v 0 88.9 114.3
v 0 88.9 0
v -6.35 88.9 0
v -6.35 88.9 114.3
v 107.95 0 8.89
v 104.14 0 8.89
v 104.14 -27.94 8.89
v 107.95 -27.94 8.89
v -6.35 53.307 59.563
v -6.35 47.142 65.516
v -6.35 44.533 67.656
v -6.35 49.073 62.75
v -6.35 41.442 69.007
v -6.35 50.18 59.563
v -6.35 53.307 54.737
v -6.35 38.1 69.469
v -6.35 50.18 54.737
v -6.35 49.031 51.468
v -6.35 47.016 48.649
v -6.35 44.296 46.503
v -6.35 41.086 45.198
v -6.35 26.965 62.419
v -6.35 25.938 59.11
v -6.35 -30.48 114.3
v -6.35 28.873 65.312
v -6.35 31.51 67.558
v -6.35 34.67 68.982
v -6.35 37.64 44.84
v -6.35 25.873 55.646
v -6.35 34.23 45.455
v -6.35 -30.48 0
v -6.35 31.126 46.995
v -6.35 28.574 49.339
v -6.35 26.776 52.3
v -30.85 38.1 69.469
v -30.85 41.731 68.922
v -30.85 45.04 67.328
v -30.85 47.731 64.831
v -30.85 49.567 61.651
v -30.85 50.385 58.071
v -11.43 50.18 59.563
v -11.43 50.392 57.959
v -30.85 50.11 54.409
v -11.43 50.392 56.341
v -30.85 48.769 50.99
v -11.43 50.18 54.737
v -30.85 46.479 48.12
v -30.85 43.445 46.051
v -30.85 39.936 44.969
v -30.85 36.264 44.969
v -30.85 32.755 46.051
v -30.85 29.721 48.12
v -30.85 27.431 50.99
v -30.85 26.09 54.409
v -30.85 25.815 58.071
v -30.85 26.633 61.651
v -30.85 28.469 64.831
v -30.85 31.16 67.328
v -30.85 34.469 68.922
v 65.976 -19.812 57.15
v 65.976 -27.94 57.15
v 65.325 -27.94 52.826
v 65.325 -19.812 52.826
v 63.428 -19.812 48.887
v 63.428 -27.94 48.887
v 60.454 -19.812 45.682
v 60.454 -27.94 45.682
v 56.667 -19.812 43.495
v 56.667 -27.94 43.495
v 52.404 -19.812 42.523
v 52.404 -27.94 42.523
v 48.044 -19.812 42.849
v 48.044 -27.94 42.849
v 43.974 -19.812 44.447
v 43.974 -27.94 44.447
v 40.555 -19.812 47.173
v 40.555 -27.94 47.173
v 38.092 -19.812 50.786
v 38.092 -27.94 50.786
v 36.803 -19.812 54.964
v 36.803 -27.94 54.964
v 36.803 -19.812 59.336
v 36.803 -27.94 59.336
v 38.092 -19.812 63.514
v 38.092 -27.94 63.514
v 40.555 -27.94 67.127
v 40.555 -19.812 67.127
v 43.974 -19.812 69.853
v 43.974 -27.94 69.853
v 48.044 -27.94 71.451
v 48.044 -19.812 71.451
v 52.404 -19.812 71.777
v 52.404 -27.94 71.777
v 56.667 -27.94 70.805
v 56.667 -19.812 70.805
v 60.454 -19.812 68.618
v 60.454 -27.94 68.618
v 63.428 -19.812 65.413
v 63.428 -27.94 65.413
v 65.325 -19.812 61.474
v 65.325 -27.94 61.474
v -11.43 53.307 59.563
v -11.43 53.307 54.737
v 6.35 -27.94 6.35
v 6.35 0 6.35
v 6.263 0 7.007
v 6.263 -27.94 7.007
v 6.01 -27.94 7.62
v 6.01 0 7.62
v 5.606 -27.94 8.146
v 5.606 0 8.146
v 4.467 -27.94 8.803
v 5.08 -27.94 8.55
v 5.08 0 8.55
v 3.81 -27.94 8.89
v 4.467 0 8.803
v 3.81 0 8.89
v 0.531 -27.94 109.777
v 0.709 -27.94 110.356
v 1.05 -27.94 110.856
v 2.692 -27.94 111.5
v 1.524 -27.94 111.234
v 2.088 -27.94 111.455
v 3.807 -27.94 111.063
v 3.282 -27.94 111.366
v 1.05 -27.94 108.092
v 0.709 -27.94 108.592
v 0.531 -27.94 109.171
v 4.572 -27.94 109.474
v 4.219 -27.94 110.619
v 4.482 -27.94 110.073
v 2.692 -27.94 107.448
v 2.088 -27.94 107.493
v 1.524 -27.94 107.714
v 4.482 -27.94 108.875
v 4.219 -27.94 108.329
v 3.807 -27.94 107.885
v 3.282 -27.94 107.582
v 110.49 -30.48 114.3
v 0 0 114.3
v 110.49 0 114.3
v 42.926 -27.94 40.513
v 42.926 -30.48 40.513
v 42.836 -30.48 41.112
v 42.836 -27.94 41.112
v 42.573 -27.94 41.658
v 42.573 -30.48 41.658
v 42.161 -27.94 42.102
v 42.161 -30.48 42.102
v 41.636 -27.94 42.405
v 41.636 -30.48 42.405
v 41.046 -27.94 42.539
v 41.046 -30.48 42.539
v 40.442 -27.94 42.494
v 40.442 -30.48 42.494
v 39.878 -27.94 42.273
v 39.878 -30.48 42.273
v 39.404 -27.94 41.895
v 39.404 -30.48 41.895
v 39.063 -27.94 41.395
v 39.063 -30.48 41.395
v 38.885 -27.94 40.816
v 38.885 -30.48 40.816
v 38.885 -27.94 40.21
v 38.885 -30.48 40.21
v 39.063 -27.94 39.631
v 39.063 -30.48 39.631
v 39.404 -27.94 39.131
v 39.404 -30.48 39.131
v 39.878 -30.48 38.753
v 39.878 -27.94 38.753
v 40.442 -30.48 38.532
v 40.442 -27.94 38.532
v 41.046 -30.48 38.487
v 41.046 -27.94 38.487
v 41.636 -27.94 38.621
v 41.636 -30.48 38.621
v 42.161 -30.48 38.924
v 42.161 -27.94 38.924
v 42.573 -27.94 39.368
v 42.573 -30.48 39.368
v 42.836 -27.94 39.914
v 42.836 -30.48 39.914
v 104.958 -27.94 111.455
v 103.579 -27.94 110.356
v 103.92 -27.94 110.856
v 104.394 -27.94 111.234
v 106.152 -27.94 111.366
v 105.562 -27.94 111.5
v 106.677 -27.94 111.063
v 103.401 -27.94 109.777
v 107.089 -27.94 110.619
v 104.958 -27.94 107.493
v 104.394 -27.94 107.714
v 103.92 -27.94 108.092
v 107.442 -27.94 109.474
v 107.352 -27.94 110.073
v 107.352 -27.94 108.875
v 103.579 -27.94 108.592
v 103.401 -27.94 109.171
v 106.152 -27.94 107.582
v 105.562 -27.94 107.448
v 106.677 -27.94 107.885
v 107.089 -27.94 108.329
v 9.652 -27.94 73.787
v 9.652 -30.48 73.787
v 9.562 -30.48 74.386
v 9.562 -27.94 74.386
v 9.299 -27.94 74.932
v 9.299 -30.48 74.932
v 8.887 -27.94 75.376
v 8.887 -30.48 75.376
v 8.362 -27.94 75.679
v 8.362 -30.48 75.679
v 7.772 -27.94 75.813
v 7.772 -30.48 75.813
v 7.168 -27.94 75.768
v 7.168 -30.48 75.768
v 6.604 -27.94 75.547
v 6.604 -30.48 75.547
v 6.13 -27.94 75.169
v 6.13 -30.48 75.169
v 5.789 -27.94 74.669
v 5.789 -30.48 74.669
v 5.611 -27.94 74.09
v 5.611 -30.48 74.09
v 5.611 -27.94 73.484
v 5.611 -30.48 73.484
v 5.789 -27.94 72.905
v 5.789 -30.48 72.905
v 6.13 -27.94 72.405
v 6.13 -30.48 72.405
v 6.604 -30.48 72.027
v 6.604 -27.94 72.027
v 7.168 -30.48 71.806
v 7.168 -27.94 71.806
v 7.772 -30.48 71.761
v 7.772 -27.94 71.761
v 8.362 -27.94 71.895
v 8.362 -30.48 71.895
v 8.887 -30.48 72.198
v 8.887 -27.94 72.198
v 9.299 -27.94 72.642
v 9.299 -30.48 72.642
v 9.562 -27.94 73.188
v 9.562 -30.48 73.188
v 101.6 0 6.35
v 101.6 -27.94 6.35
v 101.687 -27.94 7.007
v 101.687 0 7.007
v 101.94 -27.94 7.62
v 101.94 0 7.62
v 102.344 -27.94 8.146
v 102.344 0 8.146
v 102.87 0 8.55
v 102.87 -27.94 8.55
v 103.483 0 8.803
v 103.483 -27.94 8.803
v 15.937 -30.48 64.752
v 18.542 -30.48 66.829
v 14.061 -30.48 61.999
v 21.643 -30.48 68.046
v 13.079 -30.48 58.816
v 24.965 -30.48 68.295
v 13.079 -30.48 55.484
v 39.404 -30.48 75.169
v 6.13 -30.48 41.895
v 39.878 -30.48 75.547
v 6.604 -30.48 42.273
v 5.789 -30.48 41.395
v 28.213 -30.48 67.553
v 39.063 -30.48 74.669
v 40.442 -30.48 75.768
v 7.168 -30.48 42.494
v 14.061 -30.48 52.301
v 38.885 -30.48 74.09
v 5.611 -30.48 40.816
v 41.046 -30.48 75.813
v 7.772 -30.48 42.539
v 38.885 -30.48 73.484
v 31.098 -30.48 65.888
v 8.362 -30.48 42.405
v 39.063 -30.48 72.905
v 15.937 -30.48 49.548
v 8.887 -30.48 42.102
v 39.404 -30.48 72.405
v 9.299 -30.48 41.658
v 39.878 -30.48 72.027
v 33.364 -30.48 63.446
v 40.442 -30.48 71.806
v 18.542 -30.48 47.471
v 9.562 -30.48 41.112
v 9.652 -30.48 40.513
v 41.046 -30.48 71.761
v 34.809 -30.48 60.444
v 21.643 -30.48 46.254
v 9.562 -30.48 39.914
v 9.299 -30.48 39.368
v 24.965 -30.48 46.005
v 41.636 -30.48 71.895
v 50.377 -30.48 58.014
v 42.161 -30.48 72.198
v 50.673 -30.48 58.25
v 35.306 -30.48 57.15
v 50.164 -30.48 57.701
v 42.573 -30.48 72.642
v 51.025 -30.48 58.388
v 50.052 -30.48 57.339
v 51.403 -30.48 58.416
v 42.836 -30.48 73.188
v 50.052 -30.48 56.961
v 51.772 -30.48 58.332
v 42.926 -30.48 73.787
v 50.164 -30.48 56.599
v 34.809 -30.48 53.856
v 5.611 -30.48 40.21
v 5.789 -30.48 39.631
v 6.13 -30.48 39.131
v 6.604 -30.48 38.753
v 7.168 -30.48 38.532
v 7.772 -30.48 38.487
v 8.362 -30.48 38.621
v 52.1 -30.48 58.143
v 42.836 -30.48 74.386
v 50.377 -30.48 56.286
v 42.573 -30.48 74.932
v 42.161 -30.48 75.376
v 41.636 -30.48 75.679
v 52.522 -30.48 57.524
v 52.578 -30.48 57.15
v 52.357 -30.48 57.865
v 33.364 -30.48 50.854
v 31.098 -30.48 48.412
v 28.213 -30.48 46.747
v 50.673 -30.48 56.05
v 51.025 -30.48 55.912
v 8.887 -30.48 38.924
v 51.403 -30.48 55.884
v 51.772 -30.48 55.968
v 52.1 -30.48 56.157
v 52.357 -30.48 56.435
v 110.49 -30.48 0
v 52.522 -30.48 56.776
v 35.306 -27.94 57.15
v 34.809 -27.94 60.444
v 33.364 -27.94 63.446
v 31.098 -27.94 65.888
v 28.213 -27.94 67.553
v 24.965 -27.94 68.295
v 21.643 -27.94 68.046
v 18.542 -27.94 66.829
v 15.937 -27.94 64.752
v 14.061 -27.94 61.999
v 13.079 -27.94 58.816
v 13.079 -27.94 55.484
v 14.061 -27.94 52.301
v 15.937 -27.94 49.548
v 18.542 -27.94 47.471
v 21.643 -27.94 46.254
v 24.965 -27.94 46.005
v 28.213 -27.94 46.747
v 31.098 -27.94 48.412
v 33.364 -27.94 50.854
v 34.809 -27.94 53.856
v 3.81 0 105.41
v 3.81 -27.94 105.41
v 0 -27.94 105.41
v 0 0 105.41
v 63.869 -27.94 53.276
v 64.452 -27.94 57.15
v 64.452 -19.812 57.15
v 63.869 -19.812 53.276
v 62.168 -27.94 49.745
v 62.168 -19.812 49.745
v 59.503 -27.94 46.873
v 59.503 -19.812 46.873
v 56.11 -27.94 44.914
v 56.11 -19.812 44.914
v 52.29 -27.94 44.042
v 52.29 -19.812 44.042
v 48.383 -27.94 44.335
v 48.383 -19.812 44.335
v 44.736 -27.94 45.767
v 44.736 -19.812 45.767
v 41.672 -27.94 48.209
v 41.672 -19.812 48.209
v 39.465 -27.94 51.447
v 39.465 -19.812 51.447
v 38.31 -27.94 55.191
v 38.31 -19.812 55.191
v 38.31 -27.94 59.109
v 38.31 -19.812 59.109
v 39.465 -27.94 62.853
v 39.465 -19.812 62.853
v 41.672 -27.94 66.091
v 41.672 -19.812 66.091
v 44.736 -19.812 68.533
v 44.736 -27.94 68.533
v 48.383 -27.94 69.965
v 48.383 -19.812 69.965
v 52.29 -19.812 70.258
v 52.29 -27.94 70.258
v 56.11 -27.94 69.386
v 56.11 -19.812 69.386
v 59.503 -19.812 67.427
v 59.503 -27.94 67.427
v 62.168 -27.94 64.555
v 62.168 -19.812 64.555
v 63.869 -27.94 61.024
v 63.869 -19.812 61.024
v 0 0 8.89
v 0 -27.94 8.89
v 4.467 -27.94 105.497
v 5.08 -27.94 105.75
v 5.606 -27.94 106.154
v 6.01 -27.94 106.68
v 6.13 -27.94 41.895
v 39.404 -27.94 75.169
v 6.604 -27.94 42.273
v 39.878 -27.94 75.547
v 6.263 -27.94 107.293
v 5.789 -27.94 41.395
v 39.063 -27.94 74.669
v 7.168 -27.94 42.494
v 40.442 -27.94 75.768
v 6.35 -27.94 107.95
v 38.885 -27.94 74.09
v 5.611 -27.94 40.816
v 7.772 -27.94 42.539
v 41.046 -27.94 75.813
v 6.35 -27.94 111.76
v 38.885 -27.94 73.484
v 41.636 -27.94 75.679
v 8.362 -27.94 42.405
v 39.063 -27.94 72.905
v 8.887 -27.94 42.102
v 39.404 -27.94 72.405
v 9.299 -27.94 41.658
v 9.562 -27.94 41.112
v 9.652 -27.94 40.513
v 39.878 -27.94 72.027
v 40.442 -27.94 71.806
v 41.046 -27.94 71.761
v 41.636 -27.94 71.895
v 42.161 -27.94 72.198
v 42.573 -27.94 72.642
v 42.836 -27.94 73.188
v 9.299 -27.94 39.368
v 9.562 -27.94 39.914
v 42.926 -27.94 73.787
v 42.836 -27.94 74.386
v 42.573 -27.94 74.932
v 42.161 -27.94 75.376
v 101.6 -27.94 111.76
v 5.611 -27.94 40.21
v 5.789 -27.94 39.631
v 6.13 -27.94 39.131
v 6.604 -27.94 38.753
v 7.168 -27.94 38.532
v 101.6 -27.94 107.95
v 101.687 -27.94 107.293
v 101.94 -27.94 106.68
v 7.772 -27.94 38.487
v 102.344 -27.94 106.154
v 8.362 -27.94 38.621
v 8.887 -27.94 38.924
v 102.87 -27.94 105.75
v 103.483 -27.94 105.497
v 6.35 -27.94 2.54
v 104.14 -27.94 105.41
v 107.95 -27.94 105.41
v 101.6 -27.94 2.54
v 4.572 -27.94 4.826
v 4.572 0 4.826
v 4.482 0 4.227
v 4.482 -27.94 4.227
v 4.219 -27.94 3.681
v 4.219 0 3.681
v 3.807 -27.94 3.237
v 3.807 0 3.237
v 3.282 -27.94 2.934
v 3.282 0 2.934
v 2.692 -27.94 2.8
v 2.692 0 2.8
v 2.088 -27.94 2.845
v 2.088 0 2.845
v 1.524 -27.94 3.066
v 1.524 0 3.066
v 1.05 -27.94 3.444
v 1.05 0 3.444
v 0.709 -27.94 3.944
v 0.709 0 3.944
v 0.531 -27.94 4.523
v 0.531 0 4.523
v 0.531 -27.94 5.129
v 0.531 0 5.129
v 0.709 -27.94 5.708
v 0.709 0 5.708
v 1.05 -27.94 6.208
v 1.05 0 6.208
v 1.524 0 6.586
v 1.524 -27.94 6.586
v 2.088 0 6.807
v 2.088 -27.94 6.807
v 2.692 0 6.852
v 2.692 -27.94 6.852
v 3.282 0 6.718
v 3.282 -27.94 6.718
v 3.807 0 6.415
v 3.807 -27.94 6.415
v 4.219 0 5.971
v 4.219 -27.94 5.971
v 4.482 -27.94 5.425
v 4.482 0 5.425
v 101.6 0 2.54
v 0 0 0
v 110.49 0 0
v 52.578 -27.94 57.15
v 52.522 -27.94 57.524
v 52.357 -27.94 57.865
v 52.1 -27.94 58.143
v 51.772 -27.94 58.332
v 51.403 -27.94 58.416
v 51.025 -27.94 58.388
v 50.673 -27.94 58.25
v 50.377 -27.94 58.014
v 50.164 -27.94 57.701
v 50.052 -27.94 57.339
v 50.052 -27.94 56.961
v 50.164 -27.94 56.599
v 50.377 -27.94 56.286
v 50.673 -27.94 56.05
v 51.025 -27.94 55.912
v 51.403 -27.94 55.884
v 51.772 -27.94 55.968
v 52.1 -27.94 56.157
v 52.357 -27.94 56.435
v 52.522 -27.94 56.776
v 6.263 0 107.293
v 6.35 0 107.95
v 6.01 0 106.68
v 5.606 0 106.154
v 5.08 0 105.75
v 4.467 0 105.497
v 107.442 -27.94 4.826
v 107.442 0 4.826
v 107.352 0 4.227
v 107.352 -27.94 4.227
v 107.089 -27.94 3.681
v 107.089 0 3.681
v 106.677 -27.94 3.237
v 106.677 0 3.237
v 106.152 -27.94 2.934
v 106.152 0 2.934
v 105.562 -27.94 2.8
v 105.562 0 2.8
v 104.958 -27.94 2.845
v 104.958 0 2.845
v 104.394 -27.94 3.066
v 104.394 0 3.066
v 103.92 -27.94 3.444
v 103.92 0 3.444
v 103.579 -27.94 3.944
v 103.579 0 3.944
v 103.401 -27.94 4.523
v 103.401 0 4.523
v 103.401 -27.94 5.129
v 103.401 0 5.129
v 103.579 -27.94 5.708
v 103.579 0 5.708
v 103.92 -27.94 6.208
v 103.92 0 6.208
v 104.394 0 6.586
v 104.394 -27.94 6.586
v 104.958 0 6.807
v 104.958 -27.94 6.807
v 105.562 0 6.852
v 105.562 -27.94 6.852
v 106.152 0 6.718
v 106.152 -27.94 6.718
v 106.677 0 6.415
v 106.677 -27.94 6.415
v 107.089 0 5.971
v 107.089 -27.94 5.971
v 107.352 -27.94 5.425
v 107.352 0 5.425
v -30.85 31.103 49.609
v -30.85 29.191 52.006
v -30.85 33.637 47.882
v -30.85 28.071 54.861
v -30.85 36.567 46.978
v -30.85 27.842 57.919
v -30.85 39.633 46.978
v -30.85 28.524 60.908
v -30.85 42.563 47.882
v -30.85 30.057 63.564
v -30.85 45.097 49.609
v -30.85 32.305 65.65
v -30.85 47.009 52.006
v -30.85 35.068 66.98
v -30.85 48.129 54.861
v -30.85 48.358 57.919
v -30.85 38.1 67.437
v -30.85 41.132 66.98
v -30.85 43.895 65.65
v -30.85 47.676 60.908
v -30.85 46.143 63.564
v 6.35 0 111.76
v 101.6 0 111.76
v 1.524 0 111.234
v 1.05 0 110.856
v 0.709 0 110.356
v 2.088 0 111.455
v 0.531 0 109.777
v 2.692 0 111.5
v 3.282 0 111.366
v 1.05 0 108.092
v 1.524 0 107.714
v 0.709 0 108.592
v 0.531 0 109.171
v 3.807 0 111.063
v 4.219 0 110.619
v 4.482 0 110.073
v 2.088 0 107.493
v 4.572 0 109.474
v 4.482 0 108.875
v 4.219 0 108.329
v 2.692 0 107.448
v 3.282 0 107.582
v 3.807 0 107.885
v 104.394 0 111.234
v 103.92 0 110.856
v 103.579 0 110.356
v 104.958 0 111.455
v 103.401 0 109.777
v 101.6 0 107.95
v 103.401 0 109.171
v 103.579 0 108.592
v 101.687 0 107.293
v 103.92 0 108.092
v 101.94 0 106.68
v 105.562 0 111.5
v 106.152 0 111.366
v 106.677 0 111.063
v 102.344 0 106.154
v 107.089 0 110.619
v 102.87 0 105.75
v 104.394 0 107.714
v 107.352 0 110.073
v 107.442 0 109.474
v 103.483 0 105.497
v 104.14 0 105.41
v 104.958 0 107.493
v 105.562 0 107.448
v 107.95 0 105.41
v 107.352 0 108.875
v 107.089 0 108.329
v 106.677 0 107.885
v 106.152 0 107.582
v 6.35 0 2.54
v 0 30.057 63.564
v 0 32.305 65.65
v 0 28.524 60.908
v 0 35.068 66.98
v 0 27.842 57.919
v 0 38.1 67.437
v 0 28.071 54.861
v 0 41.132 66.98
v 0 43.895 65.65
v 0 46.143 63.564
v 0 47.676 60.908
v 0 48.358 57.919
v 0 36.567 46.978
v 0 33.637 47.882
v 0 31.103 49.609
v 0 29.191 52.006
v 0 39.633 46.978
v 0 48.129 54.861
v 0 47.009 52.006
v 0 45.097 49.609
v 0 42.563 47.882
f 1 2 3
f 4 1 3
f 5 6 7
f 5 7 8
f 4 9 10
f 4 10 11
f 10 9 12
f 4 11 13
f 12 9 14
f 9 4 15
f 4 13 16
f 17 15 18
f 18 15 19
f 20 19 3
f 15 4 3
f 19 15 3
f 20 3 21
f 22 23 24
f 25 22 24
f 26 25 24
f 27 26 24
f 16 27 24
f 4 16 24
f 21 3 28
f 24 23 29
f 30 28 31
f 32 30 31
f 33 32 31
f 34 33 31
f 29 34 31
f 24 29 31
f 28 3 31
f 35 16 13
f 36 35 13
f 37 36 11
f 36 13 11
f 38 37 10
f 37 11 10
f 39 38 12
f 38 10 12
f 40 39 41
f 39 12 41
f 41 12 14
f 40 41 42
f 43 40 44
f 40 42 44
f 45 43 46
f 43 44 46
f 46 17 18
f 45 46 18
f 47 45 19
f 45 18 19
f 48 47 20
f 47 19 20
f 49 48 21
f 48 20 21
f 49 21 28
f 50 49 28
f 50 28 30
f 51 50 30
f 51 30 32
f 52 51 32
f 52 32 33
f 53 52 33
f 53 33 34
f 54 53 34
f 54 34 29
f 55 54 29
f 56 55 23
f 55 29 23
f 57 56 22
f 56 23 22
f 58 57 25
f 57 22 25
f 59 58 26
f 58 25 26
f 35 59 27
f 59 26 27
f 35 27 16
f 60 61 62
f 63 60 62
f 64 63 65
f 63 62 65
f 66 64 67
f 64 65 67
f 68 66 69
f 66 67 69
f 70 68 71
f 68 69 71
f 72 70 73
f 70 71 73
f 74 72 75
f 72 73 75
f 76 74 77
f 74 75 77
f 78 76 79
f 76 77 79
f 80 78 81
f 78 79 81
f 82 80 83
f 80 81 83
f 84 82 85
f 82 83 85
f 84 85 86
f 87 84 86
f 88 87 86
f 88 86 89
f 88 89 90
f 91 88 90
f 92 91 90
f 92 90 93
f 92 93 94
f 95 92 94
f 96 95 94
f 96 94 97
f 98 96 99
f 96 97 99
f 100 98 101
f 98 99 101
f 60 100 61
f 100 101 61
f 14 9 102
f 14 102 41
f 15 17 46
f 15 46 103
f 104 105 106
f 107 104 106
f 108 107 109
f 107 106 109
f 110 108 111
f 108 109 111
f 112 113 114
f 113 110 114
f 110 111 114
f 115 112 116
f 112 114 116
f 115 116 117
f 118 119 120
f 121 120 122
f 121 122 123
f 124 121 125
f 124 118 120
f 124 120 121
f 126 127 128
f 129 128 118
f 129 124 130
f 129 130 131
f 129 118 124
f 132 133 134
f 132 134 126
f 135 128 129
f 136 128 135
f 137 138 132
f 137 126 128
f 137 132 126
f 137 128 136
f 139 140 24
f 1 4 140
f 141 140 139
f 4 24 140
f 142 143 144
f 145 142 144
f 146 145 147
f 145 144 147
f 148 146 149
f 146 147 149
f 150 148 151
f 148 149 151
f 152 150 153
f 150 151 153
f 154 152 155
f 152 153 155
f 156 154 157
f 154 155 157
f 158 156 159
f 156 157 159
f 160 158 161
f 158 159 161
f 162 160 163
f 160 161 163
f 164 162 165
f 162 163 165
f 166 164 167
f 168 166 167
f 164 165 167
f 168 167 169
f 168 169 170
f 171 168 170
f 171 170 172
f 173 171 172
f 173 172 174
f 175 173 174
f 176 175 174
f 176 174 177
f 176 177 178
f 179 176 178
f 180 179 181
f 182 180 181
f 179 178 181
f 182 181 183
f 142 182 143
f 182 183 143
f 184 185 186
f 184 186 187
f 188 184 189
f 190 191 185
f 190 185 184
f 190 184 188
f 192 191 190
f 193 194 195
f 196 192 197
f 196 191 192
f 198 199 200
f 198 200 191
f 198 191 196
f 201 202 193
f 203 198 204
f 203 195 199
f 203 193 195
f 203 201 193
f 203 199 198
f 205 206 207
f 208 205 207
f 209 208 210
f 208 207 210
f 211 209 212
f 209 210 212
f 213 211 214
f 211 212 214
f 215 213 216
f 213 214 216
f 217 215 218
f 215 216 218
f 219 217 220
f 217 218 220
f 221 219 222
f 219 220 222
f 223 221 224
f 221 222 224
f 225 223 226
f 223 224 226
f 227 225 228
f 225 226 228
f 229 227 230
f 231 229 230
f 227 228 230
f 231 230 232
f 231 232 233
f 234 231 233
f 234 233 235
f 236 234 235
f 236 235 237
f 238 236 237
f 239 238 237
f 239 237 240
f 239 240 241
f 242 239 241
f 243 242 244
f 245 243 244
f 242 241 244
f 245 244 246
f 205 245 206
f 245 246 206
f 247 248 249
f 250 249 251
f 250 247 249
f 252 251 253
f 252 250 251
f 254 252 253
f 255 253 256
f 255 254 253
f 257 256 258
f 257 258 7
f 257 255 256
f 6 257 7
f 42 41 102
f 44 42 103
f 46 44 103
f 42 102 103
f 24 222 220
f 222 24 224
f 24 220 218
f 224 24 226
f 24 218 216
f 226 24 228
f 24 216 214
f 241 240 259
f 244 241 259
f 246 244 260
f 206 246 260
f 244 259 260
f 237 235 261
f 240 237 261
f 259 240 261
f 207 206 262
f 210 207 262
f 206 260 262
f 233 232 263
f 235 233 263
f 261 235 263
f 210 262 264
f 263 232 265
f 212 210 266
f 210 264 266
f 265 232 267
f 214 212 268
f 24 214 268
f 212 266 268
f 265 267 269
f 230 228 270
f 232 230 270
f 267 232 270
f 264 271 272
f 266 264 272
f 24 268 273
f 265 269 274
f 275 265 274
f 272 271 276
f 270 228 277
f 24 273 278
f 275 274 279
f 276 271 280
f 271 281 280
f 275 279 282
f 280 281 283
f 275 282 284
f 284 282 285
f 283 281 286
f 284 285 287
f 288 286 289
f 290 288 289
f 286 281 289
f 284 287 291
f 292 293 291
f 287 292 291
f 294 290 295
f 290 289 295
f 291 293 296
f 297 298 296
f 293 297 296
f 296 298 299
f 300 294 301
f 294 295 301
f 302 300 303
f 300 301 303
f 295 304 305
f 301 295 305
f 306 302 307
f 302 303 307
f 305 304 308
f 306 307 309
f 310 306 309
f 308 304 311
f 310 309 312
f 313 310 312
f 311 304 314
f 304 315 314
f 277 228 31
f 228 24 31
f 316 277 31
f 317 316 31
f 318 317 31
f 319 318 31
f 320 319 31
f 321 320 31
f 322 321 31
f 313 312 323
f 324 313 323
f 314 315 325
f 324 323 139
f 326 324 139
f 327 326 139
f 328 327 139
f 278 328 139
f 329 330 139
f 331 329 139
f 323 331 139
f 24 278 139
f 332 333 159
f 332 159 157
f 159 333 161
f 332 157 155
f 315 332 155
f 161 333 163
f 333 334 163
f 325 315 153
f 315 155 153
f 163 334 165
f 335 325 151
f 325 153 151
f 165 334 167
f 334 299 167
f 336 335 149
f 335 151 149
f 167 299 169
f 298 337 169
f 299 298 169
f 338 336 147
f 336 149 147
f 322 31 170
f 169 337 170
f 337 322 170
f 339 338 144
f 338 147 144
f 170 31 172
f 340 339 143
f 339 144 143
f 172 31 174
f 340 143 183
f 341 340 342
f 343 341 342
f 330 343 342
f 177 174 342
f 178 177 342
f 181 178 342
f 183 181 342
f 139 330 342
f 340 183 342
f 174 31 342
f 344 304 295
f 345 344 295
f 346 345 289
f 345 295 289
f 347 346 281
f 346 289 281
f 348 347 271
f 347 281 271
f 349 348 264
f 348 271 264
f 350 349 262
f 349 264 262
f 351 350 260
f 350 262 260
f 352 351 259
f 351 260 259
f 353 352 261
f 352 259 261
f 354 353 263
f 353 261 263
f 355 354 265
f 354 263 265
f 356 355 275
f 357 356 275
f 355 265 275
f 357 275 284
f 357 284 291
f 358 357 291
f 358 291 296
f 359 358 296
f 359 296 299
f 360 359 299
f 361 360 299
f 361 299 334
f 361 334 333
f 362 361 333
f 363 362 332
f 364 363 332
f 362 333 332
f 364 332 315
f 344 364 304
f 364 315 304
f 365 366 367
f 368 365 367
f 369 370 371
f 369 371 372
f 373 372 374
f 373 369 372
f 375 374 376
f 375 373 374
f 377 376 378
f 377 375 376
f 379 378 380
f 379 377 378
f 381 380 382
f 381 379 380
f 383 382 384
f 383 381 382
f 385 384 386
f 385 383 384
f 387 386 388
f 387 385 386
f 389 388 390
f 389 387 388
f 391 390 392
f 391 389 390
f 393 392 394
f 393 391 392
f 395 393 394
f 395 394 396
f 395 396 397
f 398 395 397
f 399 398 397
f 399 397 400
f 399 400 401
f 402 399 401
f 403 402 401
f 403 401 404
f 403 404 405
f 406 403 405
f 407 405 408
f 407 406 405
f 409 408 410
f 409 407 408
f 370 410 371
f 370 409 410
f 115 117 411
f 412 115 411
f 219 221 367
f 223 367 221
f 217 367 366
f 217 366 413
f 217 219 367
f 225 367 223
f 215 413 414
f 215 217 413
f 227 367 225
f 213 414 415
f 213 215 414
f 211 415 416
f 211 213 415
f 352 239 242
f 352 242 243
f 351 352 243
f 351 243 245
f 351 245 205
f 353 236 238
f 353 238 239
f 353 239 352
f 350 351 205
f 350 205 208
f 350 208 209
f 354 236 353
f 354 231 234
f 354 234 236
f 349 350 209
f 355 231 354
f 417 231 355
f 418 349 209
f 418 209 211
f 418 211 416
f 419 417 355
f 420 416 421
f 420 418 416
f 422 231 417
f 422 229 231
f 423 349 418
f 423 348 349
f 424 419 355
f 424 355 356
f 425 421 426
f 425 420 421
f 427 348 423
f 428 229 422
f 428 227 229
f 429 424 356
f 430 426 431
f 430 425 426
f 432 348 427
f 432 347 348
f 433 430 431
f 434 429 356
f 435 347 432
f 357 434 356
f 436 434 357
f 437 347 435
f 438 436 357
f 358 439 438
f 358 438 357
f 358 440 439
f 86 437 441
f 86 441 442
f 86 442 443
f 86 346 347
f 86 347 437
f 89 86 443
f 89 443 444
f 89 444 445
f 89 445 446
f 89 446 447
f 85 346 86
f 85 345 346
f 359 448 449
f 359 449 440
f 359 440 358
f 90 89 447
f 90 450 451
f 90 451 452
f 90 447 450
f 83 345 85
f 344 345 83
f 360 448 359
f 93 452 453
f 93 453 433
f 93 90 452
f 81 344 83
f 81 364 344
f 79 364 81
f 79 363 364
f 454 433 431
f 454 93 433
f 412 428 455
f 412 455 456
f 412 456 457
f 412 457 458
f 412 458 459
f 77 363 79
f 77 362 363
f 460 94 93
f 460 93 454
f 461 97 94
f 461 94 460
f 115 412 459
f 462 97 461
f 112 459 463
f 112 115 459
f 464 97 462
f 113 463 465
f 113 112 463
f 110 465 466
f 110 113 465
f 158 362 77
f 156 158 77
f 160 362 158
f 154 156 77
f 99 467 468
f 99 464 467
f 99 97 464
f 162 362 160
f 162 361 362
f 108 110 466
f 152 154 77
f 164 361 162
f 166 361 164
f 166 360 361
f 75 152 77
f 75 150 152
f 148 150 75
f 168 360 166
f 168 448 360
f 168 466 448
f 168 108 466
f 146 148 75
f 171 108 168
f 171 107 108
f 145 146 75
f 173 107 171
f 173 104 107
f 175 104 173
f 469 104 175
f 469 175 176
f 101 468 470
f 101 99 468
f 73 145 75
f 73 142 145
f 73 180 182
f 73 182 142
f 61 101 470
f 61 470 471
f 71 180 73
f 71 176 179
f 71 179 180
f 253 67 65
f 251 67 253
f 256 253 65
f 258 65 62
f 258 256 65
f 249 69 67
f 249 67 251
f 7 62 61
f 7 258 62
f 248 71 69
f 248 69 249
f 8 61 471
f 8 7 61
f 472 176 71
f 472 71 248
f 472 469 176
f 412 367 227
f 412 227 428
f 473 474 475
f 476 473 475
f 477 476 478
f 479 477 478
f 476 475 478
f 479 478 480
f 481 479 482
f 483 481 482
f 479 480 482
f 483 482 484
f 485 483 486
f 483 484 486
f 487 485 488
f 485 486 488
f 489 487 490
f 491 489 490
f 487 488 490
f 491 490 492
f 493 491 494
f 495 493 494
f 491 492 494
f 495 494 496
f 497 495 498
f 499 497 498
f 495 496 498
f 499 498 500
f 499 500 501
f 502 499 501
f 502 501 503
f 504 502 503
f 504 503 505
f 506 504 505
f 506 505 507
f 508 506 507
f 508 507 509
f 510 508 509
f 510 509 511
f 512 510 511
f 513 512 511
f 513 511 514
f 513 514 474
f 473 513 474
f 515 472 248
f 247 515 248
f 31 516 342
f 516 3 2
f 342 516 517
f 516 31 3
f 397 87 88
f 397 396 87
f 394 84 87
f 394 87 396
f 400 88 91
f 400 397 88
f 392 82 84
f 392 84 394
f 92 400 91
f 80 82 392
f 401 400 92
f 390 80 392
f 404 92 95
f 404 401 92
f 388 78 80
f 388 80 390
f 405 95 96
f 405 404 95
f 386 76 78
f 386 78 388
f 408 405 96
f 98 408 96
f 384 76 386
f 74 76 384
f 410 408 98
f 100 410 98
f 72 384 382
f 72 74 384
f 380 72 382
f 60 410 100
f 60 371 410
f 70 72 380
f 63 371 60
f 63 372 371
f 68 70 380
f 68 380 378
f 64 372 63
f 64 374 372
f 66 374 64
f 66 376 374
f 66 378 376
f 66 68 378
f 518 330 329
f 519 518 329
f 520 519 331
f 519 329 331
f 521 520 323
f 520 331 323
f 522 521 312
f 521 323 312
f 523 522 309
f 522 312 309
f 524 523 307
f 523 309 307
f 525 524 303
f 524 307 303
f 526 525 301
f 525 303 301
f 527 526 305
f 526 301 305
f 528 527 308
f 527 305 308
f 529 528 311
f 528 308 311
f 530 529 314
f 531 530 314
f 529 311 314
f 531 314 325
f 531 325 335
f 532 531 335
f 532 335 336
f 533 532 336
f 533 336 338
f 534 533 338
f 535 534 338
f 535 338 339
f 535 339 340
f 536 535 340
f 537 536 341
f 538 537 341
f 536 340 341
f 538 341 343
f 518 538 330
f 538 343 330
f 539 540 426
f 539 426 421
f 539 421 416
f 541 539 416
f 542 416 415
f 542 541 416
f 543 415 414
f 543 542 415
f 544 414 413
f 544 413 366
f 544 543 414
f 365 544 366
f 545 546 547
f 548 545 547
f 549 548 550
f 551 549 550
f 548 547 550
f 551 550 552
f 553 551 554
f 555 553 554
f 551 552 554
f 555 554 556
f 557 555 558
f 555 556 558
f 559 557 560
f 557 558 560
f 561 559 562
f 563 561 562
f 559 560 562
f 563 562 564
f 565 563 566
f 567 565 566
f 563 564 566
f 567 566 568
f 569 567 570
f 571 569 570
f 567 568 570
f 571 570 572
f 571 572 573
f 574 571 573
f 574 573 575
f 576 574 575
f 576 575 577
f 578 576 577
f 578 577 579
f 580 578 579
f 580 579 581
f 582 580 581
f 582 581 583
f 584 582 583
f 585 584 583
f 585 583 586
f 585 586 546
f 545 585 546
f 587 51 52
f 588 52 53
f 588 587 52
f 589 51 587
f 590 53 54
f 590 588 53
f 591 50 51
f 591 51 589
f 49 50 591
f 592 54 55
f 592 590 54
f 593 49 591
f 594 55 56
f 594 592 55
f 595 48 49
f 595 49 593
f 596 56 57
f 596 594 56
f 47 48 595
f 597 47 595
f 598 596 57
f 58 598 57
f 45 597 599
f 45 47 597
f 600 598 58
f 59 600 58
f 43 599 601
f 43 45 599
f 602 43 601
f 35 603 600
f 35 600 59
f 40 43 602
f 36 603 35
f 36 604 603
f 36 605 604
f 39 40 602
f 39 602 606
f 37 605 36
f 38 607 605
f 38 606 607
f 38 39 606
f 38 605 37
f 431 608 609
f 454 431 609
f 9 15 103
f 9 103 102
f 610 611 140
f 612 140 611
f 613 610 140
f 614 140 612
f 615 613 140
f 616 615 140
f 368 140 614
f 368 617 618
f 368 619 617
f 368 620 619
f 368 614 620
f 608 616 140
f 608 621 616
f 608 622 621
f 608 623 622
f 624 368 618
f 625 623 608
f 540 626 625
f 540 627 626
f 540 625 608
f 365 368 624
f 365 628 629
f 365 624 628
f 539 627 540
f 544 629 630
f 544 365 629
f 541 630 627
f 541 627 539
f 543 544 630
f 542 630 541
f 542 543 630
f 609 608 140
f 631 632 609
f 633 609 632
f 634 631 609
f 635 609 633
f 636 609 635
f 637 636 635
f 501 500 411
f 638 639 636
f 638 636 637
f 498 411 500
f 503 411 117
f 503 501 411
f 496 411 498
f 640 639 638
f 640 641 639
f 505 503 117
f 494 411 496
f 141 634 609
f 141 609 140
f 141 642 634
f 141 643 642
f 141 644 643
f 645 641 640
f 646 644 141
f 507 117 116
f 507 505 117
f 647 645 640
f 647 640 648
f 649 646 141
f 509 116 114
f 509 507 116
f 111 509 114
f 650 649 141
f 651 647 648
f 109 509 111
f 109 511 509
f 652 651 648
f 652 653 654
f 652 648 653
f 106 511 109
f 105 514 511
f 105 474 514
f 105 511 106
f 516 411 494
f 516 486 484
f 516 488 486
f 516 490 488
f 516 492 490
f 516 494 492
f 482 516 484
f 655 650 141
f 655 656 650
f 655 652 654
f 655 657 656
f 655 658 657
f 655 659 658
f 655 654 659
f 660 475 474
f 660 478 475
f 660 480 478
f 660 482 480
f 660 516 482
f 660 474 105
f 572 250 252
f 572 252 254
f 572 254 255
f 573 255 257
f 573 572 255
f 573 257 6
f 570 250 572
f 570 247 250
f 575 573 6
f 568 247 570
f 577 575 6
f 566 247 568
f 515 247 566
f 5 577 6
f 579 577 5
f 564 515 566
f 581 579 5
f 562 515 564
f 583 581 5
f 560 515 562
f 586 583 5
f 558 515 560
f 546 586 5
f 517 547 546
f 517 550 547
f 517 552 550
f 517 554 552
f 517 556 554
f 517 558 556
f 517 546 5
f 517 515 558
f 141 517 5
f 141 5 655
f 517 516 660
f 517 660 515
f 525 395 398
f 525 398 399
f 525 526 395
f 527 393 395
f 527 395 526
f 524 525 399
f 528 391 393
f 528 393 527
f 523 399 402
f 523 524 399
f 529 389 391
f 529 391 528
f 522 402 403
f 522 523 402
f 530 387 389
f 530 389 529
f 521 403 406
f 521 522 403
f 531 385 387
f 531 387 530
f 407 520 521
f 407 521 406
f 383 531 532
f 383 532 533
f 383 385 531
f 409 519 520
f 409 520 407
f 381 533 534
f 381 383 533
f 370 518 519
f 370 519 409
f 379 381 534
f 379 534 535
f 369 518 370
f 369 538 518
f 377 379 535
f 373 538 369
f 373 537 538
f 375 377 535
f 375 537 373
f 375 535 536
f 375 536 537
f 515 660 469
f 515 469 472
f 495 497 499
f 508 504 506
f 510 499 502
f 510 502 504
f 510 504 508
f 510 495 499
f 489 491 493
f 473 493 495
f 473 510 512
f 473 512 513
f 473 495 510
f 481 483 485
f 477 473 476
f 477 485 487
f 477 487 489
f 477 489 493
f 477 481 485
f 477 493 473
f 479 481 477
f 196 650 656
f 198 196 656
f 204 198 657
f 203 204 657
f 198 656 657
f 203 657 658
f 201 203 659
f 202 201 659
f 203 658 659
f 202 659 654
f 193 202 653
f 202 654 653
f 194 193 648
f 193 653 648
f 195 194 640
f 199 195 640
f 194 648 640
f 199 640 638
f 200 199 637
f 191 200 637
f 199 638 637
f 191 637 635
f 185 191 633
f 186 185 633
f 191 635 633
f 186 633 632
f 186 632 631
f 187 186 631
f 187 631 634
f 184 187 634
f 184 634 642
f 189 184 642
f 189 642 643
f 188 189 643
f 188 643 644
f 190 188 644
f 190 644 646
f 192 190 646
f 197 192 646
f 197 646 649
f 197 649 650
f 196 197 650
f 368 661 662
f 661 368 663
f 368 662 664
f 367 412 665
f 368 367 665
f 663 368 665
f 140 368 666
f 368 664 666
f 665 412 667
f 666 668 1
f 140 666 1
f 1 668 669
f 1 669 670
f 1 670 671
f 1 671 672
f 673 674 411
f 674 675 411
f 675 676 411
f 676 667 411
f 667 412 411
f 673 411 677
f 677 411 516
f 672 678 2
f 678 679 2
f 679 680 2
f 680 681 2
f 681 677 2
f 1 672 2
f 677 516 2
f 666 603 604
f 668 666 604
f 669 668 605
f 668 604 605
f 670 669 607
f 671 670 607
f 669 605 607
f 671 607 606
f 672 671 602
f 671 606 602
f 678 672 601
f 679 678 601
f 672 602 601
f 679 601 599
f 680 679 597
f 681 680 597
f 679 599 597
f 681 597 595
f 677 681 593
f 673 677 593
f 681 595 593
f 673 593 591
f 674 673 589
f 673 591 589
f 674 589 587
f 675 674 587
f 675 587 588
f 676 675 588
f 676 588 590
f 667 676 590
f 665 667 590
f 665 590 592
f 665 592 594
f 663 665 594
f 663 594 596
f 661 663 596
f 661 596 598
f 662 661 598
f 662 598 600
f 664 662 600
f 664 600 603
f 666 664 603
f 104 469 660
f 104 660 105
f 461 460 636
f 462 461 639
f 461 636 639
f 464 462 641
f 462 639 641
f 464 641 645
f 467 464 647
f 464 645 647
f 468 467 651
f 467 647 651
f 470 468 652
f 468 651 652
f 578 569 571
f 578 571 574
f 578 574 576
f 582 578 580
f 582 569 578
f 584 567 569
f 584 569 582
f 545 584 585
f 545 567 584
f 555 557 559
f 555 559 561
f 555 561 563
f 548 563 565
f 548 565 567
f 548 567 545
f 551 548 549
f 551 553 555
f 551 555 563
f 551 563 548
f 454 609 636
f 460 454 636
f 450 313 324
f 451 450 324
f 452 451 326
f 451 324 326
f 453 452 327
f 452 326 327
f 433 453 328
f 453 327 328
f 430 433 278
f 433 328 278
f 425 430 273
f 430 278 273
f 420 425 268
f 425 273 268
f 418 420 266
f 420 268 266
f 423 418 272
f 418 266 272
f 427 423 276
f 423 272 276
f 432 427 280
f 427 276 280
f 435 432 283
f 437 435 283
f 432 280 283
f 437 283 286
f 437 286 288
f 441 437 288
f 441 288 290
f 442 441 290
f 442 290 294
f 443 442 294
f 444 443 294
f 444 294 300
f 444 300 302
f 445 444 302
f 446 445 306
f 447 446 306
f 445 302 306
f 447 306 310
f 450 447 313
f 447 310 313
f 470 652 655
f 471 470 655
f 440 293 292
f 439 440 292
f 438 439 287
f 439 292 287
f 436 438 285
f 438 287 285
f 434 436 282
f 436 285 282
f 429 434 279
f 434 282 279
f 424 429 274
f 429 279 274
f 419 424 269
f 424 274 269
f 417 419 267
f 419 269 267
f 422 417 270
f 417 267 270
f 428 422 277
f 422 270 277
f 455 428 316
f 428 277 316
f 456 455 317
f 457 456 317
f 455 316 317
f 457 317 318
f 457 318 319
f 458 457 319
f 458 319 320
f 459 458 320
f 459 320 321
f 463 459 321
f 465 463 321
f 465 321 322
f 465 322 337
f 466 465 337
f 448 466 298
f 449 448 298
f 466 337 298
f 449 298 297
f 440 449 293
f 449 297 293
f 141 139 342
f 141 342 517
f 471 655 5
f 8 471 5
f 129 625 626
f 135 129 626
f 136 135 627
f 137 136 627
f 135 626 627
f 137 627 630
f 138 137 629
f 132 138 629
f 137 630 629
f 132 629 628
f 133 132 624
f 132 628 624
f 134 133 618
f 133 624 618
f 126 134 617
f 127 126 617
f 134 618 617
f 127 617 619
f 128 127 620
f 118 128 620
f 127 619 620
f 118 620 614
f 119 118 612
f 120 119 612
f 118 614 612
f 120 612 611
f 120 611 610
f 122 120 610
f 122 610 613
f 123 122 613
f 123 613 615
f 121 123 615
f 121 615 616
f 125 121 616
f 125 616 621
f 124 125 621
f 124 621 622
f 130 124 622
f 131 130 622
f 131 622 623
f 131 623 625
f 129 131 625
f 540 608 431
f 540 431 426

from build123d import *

# Parameters (mm, degrees)
BOSS_EXTRUDE1_DEPTH  = 114.3
SKETCH3_W            = 107.95
SKETCH3_H            = 109.22
CUT_EXTRUDE1_DEPTH   = 27.94
BOSS_EXTRUDE14_REACH = 32.48
SKETCH4_R            = 2.032
SKETCH5_R            = 2.032
SKETCH5_R_2          = 11.176
SKETCH5_R_3          = 1.27
CUT_EXTRUDE2_DEPTH   = 2.54
SKETCH7_R            = 12.319
BOSS_EXTRUDE15_DEPTH = 24.5
CUT_EXTRUDE3_REACH   = 143.34
SKETCH8_R            = 10.287
BOSS_EXTRUDE17_DEPTH = 5.08
SKETCH16_R           = 14.6685
SKETCH16_R_2         = 13.1445
BOSS_EXTRUDE18_DEPTH = 8.128


with BuildPart() as part:
    # Sketch1 → Boss-Extrude1 (new body)
    with BuildSketch(Plane.XY):
        Polygon((0, 0), (0, 88.9), (-6.35, 88.9), (-6.35, -30.48), (110.49, -30.48), (110.49, 0), align=None)
    extrude(amount=BOSS_EXTRUDE1_DEPTH)

    # Sketch3 → Cut-Extrude1 (cut)
    with BuildSketch(Plane(origin=(0, 0, 0), x_dir=(1, 0, 0), z_dir=(0, 1, 0))):
        with Locations((53.975, -57.15)):
            Rectangle(SKETCH3_W, SKETCH3_H)
    extrude(amount=-CUT_EXTRUDE1_DEPTH, mode=Mode.SUBTRACT)

    # Sketch4 → Boss-Extrude14 (add, up to next)
    with BuildSketch(Plane(origin=(0, 0, 0), x_dir=(1, 0, 0), z_dir=(0, 1, 0)), mode=Mode.PRIVATE) as boss_extrude14_sk1:
        with BuildLine():
            Line((0, -2.54), (6.35, -2.54))
            Line((6.35, -2.54), (6.35, -6.35))
            ThreePointArc((6.35, -6.35), (5.606051224, -8.146051224), (3.81, -8.89))
            Line((3.81, -8.89), (0, -8.89))
            Line((0, -8.89), (0, -2.54))
        make_face()
        with Locations((2.54, -4.826)):
            Circle(SKETCH4_R, mode=Mode.SUBTRACT)
    boss_extrude14_tool1 = extrude(boss_extrude14_sk1.sketch, amount=-BOSS_EXTRUDE14_REACH, mode=Mode.PRIVATE) - part.part
    add(boss_extrude14_tool1.solids().sort_by_distance((3.175, 0, 2.629803))[0])
    # Sketch4 → Boss-Extrude14 (add, up to next)
    with BuildSketch(Plane(origin=(0, 0, 0), x_dir=(1, 0, 0), z_dir=(0, 1, 0)), mode=Mode.PRIVATE) as boss_extrude14_sk2:
        with BuildLine():
            Line((101.6, -2.54), (101.6, -6.35))
            ThreePointArc((101.6, -6.35), (102.343948776, -8.146051224), (104.14, -8.89))
            Line((104.14, -8.89), (107.95, -8.89))
            Line((107.95, -8.89), (107.95, -2.54))
            Line((107.95, -2.54), (101.6, -2.54))
        make_face()
        with Locations((105.41, -4.826)):
            Circle(SKETCH4_R, mode=Mode.SUBTRACT)
    boss_extrude14_tool2 = extrude(boss_extrude14_sk2.sketch, amount=-BOSS_EXTRUDE14_REACH, mode=Mode.PRIVATE) - part.part
    add(boss_extrude14_tool2.solids().sort_by_distance((101.689803, 0, 4.445))[0])
    # Sketch4 → Boss-Extrude14 (add, up to next)
    with BuildSketch(Plane(origin=(0, 0, 0), x_dir=(1, 0, 0), z_dir=(0, 1, 0)), mode=Mode.PRIVATE) as boss_extrude14_sk3:
        with BuildLine():
            Line((107.95, -111.76), (101.6, -111.76))
            Line((101.6, -111.76), (101.6, -107.95))
            ThreePointArc((101.6, -107.95), (102.343948776, -106.153948776), (104.14, -105.41))
            Line((104.14, -105.41), (107.95, -105.41))
            Line((107.95, -105.41), (107.95, -111.76))
        make_face()
        with Locations((105.41, -109.474)):
            Circle(SKETCH4_R, mode=Mode.SUBTRACT)
    boss_extrude14_tool3 = extrude(boss_extrude14_sk3.sketch, amount=-BOSS_EXTRUDE14_REACH, mode=Mode.PRIVATE) - part.part
    add(boss_extrude14_tool3.solids().sort_by_distance((104.775, 0, 111.670197))[0])
    # Sketch4 → Boss-Extrude14 (add, up to next)
    with BuildSketch(Plane(origin=(0, 0, 0), x_dir=(1, 0, 0), z_dir=(0, 1, 0)), mode=Mode.PRIVATE) as boss_extrude14_sk4:
        with BuildLine():
            Line((6.35, -111.76), (6.35, -107.95))
            ThreePointArc((6.35, -107.95), (5.606051224, -106.153948776), (3.81, -105.41))
            Line((3.81, -105.41), (0, -105.41))
            Line((0, -105.41), (0, -111.76))
            Line((0, -111.76), (6.35, -111.76))
        make_face()
        with Locations((2.54, -109.474)):
            Circle(SKETCH4_R, mode=Mode.SUBTRACT)
    boss_extrude14_tool4 = extrude(boss_extrude14_sk4.sketch, amount=-BOSS_EXTRUDE14_REACH, mode=Mode.PRIVATE) - part.part
    add(boss_extrude14_tool4.solids().sort_by_distance((6.260197, 0, 109.855))[0])

    # Sketch5 → Cut-Extrude2 (cut)
    with BuildSketch(Plane.XZ.offset(30.48)):
        with Locations((7.62, 73.787)):
            Circle(SKETCH5_R)
        with Locations((40.894, 73.787)):
            Circle(SKETCH5_R)
        with Locations((40.894, 40.513)):
            Circle(SKETCH5_R)
        with Locations((7.62, 40.513)):
            Circle(SKETCH5_R)
        with Locations((24.13, 57.15)):
            Circle(SKETCH5_R_2)
        with Locations((51.308, 57.15)):
            Circle(SKETCH5_R_3)
    extrude(amount=-CUT_EXTRUDE2_DEPTH, mode=Mode.SUBTRACT)

    # Sketch7 → Boss-Extrude15 (add)
    with BuildSketch(Plane.ZY.offset(6.35)):
        with Locations((57.15, 38.1)):
            Circle(SKETCH7_R)
    extrude(amount=BOSS_EXTRUDE15_DEPTH)

    # Sketch8 → Cut-Extrude3 (cut, up to next)
    with BuildSketch(Plane.ZY.offset(30.85), mode=Mode.PRIVATE) as cut_extrude3_sk1:
        with Locations((57.15, 38.1)):
            Circle(SKETCH8_R)
    cut_extrude3_tool1 = extrude(cut_extrude3_sk1.sketch, amount=-CUT_EXTRUDE3_REACH, mode=Mode.PRIVATE) & part.part
    add(cut_extrude3_tool1.solids().sort_by_distance((-30.85, 38.1, 57.15))[0], mode=Mode.SUBTRACT)

    # Sketch11 → Boss-Extrude17 (add)
    with BuildSketch(Plane.ZY.offset(6.35)):
        with BuildLine():
            Line((54.737, 50.180363902), (54.737, 53.307305955))
            Line((54.737, 53.307305955), (59.563, 53.307305955))
            Line((59.563, 53.307305955), (59.563, 50.180363902))
            ThreePointArc((59.563, 50.180363902), (57.15, 50.419), (54.737, 50.180363902))
        make_face()
    extrude(amount=BOSS_EXTRUDE17_DEPTH)

    # Sketch16 → Boss-Extrude18 (add)
    with BuildSketch(Plane(origin=(0, -27.94, 0), x_dir=(1, 0, 0), z_dir=(0, 1, 0))):
        with Locations((51.308, -57.15)):
            Circle(SKETCH16_R)
        with Locations((51.308, -57.15)):
            Circle(SKETCH16_R_2, mode=Mode.SUBTRACT)
    extrude(amount=BOSS_EXTRUDE18_DEPTH)


solid = part.part
